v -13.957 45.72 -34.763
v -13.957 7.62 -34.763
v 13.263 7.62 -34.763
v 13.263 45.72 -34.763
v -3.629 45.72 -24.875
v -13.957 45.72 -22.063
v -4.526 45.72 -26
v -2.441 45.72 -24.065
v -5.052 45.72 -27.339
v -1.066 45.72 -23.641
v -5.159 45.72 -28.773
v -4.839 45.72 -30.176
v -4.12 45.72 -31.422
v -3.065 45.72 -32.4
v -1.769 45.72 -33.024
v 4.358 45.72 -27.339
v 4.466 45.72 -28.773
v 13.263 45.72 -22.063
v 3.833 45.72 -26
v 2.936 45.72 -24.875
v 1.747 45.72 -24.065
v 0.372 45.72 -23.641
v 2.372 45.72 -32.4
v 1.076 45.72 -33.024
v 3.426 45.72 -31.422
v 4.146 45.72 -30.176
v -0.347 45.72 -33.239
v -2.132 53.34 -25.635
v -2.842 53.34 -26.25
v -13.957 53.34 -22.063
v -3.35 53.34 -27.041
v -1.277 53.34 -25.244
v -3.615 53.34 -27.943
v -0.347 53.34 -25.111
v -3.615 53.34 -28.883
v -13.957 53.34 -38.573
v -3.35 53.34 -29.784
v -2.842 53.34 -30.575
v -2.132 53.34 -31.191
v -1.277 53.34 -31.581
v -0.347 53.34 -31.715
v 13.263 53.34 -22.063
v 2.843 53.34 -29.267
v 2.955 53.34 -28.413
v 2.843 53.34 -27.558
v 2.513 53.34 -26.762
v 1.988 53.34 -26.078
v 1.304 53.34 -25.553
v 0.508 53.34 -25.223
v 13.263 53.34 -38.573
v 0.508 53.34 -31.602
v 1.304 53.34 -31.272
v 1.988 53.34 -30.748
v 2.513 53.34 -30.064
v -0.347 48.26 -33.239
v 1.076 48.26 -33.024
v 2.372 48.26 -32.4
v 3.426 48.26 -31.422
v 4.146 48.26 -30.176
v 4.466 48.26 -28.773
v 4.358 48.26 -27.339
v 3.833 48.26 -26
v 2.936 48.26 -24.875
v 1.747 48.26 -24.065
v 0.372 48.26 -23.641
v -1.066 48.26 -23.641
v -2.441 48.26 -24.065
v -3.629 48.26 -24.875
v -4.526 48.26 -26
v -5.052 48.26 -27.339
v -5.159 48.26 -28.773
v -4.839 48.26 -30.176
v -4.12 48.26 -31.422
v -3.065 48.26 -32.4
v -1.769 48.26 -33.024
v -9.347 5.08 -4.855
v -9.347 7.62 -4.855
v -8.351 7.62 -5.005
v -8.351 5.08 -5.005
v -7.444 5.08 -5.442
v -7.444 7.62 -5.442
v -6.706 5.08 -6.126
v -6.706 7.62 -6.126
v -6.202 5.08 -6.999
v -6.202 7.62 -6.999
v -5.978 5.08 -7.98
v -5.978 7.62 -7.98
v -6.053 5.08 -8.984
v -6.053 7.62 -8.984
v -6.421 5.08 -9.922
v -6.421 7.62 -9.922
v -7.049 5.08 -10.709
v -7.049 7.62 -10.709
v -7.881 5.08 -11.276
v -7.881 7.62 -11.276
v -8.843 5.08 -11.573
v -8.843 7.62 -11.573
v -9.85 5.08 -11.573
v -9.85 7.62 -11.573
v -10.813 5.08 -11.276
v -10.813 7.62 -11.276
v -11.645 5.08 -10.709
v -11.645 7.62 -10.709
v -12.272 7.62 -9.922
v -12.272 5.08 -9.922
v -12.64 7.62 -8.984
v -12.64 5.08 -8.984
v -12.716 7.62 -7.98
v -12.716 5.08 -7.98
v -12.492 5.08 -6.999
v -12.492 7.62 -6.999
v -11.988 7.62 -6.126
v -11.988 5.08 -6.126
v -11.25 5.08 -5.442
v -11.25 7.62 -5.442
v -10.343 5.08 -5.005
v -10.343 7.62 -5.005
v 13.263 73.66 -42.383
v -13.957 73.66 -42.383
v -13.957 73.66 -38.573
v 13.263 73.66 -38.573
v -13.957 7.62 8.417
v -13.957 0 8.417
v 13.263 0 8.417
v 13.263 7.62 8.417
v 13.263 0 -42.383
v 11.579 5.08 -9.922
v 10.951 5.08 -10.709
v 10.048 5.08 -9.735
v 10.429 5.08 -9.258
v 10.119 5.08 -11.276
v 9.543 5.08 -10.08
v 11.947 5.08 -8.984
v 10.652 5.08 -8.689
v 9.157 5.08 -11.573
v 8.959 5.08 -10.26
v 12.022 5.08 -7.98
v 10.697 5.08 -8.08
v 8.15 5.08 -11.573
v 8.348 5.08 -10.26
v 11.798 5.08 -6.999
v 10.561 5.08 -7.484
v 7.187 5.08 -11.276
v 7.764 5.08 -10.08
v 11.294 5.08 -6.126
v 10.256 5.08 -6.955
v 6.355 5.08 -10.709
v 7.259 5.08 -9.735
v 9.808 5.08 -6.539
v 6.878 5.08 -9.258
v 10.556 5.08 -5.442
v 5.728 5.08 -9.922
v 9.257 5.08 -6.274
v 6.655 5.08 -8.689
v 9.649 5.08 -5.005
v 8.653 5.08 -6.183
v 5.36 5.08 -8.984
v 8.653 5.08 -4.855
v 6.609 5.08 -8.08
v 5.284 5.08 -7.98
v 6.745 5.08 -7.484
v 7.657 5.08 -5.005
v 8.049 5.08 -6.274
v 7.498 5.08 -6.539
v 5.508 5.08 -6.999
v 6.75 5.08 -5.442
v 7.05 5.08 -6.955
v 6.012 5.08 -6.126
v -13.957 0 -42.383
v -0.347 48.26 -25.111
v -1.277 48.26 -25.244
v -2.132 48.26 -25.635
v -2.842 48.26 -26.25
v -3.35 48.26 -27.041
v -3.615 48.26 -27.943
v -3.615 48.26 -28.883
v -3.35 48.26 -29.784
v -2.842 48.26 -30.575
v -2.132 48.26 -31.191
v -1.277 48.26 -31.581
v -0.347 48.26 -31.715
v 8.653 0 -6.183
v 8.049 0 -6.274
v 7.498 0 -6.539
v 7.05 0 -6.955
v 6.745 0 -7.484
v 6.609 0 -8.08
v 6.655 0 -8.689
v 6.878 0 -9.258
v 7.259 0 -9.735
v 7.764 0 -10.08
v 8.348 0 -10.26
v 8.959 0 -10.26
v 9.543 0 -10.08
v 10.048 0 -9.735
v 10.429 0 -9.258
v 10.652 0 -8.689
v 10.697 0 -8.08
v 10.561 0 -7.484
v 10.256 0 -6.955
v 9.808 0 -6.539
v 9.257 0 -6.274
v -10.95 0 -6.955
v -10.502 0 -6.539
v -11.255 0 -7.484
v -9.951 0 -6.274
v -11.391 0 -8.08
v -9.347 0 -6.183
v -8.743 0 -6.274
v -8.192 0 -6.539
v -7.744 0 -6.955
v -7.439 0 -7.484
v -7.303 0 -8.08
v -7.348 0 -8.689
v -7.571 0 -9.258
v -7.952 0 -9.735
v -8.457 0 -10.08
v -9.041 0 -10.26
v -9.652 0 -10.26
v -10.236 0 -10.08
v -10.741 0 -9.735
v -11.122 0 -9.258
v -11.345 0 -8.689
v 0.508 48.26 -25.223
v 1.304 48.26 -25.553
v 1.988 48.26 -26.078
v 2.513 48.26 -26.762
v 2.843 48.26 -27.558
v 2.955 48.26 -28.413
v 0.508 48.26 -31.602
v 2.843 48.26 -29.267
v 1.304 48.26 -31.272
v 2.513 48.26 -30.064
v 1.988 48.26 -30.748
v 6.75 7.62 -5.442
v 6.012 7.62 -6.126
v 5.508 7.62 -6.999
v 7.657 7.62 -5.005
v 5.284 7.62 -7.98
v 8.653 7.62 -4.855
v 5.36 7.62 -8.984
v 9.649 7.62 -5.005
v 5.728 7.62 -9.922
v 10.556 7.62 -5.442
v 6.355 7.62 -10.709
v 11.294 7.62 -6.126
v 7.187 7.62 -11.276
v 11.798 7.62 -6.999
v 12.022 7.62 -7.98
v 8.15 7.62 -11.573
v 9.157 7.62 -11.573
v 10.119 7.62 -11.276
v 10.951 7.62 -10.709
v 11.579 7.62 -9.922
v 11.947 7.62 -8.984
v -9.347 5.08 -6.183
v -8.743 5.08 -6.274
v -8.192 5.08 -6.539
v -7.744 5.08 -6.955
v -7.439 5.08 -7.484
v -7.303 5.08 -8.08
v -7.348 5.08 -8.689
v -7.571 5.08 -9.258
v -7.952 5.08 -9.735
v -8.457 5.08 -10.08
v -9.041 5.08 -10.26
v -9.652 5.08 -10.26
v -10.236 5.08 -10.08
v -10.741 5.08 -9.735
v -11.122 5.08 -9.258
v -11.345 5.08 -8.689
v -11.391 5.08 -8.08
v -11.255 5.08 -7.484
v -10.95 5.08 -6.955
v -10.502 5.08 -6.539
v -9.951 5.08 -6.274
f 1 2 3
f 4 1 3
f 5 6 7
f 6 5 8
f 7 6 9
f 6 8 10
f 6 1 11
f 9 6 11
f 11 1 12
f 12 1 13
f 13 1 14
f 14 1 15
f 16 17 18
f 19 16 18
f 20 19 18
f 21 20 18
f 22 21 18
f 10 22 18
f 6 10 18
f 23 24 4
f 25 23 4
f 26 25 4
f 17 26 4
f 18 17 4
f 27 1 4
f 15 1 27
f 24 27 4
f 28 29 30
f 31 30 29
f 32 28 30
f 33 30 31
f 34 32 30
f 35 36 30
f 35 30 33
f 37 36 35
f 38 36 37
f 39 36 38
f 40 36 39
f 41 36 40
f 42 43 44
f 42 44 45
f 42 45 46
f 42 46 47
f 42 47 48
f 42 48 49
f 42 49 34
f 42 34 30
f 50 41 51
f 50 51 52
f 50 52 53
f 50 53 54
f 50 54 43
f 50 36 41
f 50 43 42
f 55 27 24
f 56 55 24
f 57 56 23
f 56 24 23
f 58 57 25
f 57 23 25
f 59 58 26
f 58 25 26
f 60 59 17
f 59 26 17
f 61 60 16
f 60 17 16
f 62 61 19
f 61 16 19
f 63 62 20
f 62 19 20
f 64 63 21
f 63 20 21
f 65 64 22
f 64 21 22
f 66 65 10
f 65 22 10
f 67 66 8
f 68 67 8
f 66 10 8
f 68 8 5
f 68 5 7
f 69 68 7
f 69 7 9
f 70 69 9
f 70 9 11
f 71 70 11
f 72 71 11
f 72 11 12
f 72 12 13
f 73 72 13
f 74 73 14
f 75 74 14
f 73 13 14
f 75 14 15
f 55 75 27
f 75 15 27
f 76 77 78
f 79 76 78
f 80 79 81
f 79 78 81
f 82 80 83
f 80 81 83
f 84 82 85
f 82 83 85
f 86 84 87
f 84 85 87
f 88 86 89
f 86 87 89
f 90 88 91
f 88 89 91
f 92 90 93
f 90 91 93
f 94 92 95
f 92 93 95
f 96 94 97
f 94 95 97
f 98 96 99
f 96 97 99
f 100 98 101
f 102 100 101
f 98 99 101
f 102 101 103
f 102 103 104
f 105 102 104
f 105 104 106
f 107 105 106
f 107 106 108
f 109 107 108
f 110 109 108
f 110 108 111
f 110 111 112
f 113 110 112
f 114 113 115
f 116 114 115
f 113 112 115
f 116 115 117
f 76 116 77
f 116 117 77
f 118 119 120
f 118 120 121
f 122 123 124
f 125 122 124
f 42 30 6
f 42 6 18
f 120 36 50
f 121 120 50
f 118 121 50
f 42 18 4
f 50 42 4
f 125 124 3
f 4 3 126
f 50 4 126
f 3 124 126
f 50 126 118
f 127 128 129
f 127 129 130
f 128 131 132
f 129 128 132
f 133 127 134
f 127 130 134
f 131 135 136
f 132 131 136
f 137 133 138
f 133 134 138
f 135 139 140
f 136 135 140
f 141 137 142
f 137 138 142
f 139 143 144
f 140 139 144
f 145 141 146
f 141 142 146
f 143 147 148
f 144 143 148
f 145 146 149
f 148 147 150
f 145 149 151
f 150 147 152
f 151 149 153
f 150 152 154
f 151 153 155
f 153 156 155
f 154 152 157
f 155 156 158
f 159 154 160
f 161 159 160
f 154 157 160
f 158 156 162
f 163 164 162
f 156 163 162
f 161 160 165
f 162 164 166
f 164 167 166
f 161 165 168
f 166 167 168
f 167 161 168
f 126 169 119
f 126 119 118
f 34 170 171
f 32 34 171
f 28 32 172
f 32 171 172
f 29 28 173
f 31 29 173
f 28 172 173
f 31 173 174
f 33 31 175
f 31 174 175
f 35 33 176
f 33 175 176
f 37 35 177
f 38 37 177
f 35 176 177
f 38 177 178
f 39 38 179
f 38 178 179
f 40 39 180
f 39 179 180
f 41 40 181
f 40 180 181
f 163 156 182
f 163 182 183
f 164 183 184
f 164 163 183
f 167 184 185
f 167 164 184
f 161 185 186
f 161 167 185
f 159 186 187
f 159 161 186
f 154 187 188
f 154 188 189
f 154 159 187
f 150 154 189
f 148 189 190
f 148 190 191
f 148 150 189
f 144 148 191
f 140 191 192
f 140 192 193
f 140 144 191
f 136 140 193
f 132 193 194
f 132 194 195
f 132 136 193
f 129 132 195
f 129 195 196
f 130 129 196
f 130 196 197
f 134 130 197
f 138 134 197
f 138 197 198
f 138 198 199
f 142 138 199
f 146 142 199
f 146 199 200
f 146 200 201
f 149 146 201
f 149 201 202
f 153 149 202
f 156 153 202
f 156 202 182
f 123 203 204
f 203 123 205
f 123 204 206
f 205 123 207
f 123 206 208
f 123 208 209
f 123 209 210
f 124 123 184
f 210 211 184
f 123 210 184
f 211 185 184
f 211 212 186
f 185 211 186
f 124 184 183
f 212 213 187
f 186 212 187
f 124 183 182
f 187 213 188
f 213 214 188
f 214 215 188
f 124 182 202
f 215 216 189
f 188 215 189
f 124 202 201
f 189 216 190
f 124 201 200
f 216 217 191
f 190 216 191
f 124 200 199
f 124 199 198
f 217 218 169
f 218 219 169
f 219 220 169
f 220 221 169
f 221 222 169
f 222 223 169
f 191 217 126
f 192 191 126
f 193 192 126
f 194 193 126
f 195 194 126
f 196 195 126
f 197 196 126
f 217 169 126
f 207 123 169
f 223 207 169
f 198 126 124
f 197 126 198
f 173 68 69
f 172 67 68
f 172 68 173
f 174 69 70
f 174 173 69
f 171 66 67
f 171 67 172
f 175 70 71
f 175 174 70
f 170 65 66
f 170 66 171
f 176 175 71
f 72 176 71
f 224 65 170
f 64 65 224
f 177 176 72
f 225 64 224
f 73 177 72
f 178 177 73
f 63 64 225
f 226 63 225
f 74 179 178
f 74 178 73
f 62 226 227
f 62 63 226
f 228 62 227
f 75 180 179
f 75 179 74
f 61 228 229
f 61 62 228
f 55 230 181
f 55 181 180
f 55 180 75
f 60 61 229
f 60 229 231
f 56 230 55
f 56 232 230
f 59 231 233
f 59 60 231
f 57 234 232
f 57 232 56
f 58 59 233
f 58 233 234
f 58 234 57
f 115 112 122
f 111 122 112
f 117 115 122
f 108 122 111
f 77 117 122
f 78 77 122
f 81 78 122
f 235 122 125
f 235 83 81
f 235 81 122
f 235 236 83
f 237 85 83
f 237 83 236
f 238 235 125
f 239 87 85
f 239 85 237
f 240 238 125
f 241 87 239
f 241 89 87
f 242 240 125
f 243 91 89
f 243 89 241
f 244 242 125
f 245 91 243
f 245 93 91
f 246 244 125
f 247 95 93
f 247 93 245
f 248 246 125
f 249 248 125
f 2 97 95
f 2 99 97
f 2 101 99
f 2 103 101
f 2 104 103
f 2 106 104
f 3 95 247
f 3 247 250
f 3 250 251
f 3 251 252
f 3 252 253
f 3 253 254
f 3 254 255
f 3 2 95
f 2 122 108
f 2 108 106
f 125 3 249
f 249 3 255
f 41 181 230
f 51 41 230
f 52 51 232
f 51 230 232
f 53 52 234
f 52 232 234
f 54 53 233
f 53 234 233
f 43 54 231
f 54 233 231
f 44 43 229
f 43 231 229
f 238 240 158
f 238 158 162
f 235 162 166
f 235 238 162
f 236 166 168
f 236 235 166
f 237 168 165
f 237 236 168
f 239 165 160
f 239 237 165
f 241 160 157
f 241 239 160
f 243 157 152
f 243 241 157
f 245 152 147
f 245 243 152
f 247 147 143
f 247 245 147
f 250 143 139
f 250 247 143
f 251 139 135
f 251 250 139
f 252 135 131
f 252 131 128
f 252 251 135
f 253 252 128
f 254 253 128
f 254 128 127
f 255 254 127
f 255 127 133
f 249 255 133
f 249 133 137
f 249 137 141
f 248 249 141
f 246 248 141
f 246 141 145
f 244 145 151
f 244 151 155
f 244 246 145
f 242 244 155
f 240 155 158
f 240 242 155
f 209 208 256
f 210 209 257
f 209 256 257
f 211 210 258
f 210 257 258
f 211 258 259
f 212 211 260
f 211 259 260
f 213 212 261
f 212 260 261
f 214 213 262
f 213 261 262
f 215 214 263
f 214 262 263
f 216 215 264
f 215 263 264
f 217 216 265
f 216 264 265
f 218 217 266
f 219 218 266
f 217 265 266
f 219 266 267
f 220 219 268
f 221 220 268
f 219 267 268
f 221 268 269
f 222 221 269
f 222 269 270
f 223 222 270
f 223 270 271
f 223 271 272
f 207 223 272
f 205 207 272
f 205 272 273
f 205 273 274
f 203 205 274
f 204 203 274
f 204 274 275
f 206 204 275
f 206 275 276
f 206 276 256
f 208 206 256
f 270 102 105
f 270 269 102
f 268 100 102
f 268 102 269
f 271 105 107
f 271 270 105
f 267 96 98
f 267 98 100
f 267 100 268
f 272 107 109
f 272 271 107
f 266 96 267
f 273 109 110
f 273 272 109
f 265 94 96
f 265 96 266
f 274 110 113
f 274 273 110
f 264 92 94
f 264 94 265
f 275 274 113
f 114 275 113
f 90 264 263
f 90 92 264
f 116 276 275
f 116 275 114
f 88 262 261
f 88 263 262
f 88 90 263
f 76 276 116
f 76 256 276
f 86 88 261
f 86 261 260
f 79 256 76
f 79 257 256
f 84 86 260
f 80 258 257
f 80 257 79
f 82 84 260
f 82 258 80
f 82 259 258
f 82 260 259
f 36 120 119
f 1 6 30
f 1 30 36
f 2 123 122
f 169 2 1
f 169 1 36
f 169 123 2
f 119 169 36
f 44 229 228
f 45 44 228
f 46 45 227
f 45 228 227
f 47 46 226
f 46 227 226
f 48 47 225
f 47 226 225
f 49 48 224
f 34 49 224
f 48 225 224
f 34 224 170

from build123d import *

# Parameters (mm, degrees)
SKETCH1_W           = 27.22
SKETCH1_H           = 50.8
BOSS_EXTRUDE1_DEPTH = 7.62
SKETCH2_R           = 2.05
CUT_EXTRUDE1_DEPTH  = 7.62
SKETCH3_R           = 3.3782
CUT_EXTRUDE2_DEPTH  = 2.54
SKETCH4_W           = 27.22
SKETCH4_H           = 7.62
BOSS_EXTRUDE2_DEPTH = 45.72
SKETCH10_W          = 27.22
SKETCH10_H          = 7.62
BOSS_EXTRUDE3_DEPTH = 12.7
CUT_EXTRUDE6_DEPTH  = 7.62
SKETCH13_R          = 4.826
CUT_EXTRUDE7_DEPTH  = 2.54
SKETCH12_W          = 27.22
SKETCH12_H          = 3.81
BOSS_EXTRUDE4_DEPTH = 20.32


with BuildPart() as part:
    # Sketch1 → Boss-Extrude1 (new body)
    with BuildSketch(Plane(origin=(0, 0, 0), x_dir=(1, 0, 0), z_dir=(0, 1, 0))):
        with Locations((-0.346834532, 16.982733813)):
            Rectangle(SKETCH1_W, SKETCH1_H)
    extrude(amount=BOSS_EXTRUDE1_DEPTH)

    # Sketch2 → Cut-Extrude1 (cut)
    with BuildSketch(Plane(origin=(0, 7.62, 0), x_dir=(1, 0, 0), z_dir=(0, 1, 0))):
        with Locations(Location((-9.346834532, 8.232733813, 0), (0, 0, 270))):
            Circle(SKETCH2_R)
    cut_extrude1 = extrude(amount=-CUT_EXTRUDE1_DEPTH, mode=Mode.SUBTRACT)

    # Sketch3 → Cut-Extrude2 (cut)
    with BuildSketch(Plane(origin=(0, 7.62, 0), x_dir=(1, 0, 0), z_dir=(0, 1, 0))):
        with Locations(Location((-9.346834532, 8.232733813, 0), (0, 0, 270))):
            Circle(SKETCH3_R)
    cut_extrude2 = extrude(amount=-CUT_EXTRUDE2_DEPTH, mode=Mode.SUBTRACT)

    # Mirror1: Cut-Extrude1, Cut-Extrude2 across plane
    add(cut_extrude1.mirror(Plane.ZY.offset(0.346834532)), mode=Mode.SUBTRACT)
    add(cut_extrude2.mirror(Plane.ZY.offset(0.346834532)), mode=Mode.SUBTRACT)

    # Sketch4 → Boss-Extrude2 (add)
    with BuildSketch(Plane(origin=(0, 7.62, 0), x_dir=(1, 0, 0), z_dir=(0, 1, 0))):
        with Locations((-0.346834532, 38.572733813)):
            Rectangle(SKETCH4_W, SKETCH4_H)
    extrude(amount=BOSS_EXTRUDE2_DEPTH)

    # Sketch10 → Boss-Extrude3 (add)
    with BuildSketch(Plane.XY.offset(-34.762733813)):
        with Locations((-0.346834532, 49.53)):
            Rectangle(SKETCH10_W, SKETCH10_H)
    extrude(amount=BOSS_EXTRUDE3_DEPTH)

    # Sketch11 → Cut-Extrude6 (cut)
    with BuildSketch(Plane.XZ.offset(-45.72)):
        with BuildLine():
            ThreePointArc((2.955165468, -28.412733813), (1.988032059, -26.077867221), (-0.346834532, -25.110733813))
            Line((-0.346834532, -25.110733813), (-0.346834532, -31.714733813))
            ThreePointArc((-0.346834532, -31.714733813), (1.988032059, -30.747600404), (2.955165468, -28.412733813))
        make_face()
        with BuildLine():
            Line((-0.346834532, -31.714733813), (-0.346834532, -25.110733813))
            ThreePointArc((-0.346834532, -25.110733813), (-3.648834532, -28.412733813), (-0.346834532, -31.714733813))
        make_face()
    extrude(amount=-CUT_EXTRUDE6_DEPTH, mode=Mode.SUBTRACT)

    # Sketch13 → Cut-Extrude7 (cut)
    with BuildSketch(Plane.XZ.offset(-45.72)):
        with Locations(Location((-0.346834532, -28.412733813, 0), (0, 0, 270))):
            Circle(SKETCH13_R)
    extrude(amount=-CUT_EXTRUDE7_DEPTH, mode=Mode.SUBTRACT)

    # Sketch12 → Boss-Extrude4 (add)
    with BuildSketch(Plane(origin=(0, 53.34, 0), x_dir=(1, 0, 0), z_dir=(0, 1, 0))):
        with Locations((-0.346834532, 40.477733813)):
            Rectangle(SKETCH12_W, SKETCH12_H)
    extrude(amount=BOSS_EXTRUDE4_DEPTH)


solid = part.part
